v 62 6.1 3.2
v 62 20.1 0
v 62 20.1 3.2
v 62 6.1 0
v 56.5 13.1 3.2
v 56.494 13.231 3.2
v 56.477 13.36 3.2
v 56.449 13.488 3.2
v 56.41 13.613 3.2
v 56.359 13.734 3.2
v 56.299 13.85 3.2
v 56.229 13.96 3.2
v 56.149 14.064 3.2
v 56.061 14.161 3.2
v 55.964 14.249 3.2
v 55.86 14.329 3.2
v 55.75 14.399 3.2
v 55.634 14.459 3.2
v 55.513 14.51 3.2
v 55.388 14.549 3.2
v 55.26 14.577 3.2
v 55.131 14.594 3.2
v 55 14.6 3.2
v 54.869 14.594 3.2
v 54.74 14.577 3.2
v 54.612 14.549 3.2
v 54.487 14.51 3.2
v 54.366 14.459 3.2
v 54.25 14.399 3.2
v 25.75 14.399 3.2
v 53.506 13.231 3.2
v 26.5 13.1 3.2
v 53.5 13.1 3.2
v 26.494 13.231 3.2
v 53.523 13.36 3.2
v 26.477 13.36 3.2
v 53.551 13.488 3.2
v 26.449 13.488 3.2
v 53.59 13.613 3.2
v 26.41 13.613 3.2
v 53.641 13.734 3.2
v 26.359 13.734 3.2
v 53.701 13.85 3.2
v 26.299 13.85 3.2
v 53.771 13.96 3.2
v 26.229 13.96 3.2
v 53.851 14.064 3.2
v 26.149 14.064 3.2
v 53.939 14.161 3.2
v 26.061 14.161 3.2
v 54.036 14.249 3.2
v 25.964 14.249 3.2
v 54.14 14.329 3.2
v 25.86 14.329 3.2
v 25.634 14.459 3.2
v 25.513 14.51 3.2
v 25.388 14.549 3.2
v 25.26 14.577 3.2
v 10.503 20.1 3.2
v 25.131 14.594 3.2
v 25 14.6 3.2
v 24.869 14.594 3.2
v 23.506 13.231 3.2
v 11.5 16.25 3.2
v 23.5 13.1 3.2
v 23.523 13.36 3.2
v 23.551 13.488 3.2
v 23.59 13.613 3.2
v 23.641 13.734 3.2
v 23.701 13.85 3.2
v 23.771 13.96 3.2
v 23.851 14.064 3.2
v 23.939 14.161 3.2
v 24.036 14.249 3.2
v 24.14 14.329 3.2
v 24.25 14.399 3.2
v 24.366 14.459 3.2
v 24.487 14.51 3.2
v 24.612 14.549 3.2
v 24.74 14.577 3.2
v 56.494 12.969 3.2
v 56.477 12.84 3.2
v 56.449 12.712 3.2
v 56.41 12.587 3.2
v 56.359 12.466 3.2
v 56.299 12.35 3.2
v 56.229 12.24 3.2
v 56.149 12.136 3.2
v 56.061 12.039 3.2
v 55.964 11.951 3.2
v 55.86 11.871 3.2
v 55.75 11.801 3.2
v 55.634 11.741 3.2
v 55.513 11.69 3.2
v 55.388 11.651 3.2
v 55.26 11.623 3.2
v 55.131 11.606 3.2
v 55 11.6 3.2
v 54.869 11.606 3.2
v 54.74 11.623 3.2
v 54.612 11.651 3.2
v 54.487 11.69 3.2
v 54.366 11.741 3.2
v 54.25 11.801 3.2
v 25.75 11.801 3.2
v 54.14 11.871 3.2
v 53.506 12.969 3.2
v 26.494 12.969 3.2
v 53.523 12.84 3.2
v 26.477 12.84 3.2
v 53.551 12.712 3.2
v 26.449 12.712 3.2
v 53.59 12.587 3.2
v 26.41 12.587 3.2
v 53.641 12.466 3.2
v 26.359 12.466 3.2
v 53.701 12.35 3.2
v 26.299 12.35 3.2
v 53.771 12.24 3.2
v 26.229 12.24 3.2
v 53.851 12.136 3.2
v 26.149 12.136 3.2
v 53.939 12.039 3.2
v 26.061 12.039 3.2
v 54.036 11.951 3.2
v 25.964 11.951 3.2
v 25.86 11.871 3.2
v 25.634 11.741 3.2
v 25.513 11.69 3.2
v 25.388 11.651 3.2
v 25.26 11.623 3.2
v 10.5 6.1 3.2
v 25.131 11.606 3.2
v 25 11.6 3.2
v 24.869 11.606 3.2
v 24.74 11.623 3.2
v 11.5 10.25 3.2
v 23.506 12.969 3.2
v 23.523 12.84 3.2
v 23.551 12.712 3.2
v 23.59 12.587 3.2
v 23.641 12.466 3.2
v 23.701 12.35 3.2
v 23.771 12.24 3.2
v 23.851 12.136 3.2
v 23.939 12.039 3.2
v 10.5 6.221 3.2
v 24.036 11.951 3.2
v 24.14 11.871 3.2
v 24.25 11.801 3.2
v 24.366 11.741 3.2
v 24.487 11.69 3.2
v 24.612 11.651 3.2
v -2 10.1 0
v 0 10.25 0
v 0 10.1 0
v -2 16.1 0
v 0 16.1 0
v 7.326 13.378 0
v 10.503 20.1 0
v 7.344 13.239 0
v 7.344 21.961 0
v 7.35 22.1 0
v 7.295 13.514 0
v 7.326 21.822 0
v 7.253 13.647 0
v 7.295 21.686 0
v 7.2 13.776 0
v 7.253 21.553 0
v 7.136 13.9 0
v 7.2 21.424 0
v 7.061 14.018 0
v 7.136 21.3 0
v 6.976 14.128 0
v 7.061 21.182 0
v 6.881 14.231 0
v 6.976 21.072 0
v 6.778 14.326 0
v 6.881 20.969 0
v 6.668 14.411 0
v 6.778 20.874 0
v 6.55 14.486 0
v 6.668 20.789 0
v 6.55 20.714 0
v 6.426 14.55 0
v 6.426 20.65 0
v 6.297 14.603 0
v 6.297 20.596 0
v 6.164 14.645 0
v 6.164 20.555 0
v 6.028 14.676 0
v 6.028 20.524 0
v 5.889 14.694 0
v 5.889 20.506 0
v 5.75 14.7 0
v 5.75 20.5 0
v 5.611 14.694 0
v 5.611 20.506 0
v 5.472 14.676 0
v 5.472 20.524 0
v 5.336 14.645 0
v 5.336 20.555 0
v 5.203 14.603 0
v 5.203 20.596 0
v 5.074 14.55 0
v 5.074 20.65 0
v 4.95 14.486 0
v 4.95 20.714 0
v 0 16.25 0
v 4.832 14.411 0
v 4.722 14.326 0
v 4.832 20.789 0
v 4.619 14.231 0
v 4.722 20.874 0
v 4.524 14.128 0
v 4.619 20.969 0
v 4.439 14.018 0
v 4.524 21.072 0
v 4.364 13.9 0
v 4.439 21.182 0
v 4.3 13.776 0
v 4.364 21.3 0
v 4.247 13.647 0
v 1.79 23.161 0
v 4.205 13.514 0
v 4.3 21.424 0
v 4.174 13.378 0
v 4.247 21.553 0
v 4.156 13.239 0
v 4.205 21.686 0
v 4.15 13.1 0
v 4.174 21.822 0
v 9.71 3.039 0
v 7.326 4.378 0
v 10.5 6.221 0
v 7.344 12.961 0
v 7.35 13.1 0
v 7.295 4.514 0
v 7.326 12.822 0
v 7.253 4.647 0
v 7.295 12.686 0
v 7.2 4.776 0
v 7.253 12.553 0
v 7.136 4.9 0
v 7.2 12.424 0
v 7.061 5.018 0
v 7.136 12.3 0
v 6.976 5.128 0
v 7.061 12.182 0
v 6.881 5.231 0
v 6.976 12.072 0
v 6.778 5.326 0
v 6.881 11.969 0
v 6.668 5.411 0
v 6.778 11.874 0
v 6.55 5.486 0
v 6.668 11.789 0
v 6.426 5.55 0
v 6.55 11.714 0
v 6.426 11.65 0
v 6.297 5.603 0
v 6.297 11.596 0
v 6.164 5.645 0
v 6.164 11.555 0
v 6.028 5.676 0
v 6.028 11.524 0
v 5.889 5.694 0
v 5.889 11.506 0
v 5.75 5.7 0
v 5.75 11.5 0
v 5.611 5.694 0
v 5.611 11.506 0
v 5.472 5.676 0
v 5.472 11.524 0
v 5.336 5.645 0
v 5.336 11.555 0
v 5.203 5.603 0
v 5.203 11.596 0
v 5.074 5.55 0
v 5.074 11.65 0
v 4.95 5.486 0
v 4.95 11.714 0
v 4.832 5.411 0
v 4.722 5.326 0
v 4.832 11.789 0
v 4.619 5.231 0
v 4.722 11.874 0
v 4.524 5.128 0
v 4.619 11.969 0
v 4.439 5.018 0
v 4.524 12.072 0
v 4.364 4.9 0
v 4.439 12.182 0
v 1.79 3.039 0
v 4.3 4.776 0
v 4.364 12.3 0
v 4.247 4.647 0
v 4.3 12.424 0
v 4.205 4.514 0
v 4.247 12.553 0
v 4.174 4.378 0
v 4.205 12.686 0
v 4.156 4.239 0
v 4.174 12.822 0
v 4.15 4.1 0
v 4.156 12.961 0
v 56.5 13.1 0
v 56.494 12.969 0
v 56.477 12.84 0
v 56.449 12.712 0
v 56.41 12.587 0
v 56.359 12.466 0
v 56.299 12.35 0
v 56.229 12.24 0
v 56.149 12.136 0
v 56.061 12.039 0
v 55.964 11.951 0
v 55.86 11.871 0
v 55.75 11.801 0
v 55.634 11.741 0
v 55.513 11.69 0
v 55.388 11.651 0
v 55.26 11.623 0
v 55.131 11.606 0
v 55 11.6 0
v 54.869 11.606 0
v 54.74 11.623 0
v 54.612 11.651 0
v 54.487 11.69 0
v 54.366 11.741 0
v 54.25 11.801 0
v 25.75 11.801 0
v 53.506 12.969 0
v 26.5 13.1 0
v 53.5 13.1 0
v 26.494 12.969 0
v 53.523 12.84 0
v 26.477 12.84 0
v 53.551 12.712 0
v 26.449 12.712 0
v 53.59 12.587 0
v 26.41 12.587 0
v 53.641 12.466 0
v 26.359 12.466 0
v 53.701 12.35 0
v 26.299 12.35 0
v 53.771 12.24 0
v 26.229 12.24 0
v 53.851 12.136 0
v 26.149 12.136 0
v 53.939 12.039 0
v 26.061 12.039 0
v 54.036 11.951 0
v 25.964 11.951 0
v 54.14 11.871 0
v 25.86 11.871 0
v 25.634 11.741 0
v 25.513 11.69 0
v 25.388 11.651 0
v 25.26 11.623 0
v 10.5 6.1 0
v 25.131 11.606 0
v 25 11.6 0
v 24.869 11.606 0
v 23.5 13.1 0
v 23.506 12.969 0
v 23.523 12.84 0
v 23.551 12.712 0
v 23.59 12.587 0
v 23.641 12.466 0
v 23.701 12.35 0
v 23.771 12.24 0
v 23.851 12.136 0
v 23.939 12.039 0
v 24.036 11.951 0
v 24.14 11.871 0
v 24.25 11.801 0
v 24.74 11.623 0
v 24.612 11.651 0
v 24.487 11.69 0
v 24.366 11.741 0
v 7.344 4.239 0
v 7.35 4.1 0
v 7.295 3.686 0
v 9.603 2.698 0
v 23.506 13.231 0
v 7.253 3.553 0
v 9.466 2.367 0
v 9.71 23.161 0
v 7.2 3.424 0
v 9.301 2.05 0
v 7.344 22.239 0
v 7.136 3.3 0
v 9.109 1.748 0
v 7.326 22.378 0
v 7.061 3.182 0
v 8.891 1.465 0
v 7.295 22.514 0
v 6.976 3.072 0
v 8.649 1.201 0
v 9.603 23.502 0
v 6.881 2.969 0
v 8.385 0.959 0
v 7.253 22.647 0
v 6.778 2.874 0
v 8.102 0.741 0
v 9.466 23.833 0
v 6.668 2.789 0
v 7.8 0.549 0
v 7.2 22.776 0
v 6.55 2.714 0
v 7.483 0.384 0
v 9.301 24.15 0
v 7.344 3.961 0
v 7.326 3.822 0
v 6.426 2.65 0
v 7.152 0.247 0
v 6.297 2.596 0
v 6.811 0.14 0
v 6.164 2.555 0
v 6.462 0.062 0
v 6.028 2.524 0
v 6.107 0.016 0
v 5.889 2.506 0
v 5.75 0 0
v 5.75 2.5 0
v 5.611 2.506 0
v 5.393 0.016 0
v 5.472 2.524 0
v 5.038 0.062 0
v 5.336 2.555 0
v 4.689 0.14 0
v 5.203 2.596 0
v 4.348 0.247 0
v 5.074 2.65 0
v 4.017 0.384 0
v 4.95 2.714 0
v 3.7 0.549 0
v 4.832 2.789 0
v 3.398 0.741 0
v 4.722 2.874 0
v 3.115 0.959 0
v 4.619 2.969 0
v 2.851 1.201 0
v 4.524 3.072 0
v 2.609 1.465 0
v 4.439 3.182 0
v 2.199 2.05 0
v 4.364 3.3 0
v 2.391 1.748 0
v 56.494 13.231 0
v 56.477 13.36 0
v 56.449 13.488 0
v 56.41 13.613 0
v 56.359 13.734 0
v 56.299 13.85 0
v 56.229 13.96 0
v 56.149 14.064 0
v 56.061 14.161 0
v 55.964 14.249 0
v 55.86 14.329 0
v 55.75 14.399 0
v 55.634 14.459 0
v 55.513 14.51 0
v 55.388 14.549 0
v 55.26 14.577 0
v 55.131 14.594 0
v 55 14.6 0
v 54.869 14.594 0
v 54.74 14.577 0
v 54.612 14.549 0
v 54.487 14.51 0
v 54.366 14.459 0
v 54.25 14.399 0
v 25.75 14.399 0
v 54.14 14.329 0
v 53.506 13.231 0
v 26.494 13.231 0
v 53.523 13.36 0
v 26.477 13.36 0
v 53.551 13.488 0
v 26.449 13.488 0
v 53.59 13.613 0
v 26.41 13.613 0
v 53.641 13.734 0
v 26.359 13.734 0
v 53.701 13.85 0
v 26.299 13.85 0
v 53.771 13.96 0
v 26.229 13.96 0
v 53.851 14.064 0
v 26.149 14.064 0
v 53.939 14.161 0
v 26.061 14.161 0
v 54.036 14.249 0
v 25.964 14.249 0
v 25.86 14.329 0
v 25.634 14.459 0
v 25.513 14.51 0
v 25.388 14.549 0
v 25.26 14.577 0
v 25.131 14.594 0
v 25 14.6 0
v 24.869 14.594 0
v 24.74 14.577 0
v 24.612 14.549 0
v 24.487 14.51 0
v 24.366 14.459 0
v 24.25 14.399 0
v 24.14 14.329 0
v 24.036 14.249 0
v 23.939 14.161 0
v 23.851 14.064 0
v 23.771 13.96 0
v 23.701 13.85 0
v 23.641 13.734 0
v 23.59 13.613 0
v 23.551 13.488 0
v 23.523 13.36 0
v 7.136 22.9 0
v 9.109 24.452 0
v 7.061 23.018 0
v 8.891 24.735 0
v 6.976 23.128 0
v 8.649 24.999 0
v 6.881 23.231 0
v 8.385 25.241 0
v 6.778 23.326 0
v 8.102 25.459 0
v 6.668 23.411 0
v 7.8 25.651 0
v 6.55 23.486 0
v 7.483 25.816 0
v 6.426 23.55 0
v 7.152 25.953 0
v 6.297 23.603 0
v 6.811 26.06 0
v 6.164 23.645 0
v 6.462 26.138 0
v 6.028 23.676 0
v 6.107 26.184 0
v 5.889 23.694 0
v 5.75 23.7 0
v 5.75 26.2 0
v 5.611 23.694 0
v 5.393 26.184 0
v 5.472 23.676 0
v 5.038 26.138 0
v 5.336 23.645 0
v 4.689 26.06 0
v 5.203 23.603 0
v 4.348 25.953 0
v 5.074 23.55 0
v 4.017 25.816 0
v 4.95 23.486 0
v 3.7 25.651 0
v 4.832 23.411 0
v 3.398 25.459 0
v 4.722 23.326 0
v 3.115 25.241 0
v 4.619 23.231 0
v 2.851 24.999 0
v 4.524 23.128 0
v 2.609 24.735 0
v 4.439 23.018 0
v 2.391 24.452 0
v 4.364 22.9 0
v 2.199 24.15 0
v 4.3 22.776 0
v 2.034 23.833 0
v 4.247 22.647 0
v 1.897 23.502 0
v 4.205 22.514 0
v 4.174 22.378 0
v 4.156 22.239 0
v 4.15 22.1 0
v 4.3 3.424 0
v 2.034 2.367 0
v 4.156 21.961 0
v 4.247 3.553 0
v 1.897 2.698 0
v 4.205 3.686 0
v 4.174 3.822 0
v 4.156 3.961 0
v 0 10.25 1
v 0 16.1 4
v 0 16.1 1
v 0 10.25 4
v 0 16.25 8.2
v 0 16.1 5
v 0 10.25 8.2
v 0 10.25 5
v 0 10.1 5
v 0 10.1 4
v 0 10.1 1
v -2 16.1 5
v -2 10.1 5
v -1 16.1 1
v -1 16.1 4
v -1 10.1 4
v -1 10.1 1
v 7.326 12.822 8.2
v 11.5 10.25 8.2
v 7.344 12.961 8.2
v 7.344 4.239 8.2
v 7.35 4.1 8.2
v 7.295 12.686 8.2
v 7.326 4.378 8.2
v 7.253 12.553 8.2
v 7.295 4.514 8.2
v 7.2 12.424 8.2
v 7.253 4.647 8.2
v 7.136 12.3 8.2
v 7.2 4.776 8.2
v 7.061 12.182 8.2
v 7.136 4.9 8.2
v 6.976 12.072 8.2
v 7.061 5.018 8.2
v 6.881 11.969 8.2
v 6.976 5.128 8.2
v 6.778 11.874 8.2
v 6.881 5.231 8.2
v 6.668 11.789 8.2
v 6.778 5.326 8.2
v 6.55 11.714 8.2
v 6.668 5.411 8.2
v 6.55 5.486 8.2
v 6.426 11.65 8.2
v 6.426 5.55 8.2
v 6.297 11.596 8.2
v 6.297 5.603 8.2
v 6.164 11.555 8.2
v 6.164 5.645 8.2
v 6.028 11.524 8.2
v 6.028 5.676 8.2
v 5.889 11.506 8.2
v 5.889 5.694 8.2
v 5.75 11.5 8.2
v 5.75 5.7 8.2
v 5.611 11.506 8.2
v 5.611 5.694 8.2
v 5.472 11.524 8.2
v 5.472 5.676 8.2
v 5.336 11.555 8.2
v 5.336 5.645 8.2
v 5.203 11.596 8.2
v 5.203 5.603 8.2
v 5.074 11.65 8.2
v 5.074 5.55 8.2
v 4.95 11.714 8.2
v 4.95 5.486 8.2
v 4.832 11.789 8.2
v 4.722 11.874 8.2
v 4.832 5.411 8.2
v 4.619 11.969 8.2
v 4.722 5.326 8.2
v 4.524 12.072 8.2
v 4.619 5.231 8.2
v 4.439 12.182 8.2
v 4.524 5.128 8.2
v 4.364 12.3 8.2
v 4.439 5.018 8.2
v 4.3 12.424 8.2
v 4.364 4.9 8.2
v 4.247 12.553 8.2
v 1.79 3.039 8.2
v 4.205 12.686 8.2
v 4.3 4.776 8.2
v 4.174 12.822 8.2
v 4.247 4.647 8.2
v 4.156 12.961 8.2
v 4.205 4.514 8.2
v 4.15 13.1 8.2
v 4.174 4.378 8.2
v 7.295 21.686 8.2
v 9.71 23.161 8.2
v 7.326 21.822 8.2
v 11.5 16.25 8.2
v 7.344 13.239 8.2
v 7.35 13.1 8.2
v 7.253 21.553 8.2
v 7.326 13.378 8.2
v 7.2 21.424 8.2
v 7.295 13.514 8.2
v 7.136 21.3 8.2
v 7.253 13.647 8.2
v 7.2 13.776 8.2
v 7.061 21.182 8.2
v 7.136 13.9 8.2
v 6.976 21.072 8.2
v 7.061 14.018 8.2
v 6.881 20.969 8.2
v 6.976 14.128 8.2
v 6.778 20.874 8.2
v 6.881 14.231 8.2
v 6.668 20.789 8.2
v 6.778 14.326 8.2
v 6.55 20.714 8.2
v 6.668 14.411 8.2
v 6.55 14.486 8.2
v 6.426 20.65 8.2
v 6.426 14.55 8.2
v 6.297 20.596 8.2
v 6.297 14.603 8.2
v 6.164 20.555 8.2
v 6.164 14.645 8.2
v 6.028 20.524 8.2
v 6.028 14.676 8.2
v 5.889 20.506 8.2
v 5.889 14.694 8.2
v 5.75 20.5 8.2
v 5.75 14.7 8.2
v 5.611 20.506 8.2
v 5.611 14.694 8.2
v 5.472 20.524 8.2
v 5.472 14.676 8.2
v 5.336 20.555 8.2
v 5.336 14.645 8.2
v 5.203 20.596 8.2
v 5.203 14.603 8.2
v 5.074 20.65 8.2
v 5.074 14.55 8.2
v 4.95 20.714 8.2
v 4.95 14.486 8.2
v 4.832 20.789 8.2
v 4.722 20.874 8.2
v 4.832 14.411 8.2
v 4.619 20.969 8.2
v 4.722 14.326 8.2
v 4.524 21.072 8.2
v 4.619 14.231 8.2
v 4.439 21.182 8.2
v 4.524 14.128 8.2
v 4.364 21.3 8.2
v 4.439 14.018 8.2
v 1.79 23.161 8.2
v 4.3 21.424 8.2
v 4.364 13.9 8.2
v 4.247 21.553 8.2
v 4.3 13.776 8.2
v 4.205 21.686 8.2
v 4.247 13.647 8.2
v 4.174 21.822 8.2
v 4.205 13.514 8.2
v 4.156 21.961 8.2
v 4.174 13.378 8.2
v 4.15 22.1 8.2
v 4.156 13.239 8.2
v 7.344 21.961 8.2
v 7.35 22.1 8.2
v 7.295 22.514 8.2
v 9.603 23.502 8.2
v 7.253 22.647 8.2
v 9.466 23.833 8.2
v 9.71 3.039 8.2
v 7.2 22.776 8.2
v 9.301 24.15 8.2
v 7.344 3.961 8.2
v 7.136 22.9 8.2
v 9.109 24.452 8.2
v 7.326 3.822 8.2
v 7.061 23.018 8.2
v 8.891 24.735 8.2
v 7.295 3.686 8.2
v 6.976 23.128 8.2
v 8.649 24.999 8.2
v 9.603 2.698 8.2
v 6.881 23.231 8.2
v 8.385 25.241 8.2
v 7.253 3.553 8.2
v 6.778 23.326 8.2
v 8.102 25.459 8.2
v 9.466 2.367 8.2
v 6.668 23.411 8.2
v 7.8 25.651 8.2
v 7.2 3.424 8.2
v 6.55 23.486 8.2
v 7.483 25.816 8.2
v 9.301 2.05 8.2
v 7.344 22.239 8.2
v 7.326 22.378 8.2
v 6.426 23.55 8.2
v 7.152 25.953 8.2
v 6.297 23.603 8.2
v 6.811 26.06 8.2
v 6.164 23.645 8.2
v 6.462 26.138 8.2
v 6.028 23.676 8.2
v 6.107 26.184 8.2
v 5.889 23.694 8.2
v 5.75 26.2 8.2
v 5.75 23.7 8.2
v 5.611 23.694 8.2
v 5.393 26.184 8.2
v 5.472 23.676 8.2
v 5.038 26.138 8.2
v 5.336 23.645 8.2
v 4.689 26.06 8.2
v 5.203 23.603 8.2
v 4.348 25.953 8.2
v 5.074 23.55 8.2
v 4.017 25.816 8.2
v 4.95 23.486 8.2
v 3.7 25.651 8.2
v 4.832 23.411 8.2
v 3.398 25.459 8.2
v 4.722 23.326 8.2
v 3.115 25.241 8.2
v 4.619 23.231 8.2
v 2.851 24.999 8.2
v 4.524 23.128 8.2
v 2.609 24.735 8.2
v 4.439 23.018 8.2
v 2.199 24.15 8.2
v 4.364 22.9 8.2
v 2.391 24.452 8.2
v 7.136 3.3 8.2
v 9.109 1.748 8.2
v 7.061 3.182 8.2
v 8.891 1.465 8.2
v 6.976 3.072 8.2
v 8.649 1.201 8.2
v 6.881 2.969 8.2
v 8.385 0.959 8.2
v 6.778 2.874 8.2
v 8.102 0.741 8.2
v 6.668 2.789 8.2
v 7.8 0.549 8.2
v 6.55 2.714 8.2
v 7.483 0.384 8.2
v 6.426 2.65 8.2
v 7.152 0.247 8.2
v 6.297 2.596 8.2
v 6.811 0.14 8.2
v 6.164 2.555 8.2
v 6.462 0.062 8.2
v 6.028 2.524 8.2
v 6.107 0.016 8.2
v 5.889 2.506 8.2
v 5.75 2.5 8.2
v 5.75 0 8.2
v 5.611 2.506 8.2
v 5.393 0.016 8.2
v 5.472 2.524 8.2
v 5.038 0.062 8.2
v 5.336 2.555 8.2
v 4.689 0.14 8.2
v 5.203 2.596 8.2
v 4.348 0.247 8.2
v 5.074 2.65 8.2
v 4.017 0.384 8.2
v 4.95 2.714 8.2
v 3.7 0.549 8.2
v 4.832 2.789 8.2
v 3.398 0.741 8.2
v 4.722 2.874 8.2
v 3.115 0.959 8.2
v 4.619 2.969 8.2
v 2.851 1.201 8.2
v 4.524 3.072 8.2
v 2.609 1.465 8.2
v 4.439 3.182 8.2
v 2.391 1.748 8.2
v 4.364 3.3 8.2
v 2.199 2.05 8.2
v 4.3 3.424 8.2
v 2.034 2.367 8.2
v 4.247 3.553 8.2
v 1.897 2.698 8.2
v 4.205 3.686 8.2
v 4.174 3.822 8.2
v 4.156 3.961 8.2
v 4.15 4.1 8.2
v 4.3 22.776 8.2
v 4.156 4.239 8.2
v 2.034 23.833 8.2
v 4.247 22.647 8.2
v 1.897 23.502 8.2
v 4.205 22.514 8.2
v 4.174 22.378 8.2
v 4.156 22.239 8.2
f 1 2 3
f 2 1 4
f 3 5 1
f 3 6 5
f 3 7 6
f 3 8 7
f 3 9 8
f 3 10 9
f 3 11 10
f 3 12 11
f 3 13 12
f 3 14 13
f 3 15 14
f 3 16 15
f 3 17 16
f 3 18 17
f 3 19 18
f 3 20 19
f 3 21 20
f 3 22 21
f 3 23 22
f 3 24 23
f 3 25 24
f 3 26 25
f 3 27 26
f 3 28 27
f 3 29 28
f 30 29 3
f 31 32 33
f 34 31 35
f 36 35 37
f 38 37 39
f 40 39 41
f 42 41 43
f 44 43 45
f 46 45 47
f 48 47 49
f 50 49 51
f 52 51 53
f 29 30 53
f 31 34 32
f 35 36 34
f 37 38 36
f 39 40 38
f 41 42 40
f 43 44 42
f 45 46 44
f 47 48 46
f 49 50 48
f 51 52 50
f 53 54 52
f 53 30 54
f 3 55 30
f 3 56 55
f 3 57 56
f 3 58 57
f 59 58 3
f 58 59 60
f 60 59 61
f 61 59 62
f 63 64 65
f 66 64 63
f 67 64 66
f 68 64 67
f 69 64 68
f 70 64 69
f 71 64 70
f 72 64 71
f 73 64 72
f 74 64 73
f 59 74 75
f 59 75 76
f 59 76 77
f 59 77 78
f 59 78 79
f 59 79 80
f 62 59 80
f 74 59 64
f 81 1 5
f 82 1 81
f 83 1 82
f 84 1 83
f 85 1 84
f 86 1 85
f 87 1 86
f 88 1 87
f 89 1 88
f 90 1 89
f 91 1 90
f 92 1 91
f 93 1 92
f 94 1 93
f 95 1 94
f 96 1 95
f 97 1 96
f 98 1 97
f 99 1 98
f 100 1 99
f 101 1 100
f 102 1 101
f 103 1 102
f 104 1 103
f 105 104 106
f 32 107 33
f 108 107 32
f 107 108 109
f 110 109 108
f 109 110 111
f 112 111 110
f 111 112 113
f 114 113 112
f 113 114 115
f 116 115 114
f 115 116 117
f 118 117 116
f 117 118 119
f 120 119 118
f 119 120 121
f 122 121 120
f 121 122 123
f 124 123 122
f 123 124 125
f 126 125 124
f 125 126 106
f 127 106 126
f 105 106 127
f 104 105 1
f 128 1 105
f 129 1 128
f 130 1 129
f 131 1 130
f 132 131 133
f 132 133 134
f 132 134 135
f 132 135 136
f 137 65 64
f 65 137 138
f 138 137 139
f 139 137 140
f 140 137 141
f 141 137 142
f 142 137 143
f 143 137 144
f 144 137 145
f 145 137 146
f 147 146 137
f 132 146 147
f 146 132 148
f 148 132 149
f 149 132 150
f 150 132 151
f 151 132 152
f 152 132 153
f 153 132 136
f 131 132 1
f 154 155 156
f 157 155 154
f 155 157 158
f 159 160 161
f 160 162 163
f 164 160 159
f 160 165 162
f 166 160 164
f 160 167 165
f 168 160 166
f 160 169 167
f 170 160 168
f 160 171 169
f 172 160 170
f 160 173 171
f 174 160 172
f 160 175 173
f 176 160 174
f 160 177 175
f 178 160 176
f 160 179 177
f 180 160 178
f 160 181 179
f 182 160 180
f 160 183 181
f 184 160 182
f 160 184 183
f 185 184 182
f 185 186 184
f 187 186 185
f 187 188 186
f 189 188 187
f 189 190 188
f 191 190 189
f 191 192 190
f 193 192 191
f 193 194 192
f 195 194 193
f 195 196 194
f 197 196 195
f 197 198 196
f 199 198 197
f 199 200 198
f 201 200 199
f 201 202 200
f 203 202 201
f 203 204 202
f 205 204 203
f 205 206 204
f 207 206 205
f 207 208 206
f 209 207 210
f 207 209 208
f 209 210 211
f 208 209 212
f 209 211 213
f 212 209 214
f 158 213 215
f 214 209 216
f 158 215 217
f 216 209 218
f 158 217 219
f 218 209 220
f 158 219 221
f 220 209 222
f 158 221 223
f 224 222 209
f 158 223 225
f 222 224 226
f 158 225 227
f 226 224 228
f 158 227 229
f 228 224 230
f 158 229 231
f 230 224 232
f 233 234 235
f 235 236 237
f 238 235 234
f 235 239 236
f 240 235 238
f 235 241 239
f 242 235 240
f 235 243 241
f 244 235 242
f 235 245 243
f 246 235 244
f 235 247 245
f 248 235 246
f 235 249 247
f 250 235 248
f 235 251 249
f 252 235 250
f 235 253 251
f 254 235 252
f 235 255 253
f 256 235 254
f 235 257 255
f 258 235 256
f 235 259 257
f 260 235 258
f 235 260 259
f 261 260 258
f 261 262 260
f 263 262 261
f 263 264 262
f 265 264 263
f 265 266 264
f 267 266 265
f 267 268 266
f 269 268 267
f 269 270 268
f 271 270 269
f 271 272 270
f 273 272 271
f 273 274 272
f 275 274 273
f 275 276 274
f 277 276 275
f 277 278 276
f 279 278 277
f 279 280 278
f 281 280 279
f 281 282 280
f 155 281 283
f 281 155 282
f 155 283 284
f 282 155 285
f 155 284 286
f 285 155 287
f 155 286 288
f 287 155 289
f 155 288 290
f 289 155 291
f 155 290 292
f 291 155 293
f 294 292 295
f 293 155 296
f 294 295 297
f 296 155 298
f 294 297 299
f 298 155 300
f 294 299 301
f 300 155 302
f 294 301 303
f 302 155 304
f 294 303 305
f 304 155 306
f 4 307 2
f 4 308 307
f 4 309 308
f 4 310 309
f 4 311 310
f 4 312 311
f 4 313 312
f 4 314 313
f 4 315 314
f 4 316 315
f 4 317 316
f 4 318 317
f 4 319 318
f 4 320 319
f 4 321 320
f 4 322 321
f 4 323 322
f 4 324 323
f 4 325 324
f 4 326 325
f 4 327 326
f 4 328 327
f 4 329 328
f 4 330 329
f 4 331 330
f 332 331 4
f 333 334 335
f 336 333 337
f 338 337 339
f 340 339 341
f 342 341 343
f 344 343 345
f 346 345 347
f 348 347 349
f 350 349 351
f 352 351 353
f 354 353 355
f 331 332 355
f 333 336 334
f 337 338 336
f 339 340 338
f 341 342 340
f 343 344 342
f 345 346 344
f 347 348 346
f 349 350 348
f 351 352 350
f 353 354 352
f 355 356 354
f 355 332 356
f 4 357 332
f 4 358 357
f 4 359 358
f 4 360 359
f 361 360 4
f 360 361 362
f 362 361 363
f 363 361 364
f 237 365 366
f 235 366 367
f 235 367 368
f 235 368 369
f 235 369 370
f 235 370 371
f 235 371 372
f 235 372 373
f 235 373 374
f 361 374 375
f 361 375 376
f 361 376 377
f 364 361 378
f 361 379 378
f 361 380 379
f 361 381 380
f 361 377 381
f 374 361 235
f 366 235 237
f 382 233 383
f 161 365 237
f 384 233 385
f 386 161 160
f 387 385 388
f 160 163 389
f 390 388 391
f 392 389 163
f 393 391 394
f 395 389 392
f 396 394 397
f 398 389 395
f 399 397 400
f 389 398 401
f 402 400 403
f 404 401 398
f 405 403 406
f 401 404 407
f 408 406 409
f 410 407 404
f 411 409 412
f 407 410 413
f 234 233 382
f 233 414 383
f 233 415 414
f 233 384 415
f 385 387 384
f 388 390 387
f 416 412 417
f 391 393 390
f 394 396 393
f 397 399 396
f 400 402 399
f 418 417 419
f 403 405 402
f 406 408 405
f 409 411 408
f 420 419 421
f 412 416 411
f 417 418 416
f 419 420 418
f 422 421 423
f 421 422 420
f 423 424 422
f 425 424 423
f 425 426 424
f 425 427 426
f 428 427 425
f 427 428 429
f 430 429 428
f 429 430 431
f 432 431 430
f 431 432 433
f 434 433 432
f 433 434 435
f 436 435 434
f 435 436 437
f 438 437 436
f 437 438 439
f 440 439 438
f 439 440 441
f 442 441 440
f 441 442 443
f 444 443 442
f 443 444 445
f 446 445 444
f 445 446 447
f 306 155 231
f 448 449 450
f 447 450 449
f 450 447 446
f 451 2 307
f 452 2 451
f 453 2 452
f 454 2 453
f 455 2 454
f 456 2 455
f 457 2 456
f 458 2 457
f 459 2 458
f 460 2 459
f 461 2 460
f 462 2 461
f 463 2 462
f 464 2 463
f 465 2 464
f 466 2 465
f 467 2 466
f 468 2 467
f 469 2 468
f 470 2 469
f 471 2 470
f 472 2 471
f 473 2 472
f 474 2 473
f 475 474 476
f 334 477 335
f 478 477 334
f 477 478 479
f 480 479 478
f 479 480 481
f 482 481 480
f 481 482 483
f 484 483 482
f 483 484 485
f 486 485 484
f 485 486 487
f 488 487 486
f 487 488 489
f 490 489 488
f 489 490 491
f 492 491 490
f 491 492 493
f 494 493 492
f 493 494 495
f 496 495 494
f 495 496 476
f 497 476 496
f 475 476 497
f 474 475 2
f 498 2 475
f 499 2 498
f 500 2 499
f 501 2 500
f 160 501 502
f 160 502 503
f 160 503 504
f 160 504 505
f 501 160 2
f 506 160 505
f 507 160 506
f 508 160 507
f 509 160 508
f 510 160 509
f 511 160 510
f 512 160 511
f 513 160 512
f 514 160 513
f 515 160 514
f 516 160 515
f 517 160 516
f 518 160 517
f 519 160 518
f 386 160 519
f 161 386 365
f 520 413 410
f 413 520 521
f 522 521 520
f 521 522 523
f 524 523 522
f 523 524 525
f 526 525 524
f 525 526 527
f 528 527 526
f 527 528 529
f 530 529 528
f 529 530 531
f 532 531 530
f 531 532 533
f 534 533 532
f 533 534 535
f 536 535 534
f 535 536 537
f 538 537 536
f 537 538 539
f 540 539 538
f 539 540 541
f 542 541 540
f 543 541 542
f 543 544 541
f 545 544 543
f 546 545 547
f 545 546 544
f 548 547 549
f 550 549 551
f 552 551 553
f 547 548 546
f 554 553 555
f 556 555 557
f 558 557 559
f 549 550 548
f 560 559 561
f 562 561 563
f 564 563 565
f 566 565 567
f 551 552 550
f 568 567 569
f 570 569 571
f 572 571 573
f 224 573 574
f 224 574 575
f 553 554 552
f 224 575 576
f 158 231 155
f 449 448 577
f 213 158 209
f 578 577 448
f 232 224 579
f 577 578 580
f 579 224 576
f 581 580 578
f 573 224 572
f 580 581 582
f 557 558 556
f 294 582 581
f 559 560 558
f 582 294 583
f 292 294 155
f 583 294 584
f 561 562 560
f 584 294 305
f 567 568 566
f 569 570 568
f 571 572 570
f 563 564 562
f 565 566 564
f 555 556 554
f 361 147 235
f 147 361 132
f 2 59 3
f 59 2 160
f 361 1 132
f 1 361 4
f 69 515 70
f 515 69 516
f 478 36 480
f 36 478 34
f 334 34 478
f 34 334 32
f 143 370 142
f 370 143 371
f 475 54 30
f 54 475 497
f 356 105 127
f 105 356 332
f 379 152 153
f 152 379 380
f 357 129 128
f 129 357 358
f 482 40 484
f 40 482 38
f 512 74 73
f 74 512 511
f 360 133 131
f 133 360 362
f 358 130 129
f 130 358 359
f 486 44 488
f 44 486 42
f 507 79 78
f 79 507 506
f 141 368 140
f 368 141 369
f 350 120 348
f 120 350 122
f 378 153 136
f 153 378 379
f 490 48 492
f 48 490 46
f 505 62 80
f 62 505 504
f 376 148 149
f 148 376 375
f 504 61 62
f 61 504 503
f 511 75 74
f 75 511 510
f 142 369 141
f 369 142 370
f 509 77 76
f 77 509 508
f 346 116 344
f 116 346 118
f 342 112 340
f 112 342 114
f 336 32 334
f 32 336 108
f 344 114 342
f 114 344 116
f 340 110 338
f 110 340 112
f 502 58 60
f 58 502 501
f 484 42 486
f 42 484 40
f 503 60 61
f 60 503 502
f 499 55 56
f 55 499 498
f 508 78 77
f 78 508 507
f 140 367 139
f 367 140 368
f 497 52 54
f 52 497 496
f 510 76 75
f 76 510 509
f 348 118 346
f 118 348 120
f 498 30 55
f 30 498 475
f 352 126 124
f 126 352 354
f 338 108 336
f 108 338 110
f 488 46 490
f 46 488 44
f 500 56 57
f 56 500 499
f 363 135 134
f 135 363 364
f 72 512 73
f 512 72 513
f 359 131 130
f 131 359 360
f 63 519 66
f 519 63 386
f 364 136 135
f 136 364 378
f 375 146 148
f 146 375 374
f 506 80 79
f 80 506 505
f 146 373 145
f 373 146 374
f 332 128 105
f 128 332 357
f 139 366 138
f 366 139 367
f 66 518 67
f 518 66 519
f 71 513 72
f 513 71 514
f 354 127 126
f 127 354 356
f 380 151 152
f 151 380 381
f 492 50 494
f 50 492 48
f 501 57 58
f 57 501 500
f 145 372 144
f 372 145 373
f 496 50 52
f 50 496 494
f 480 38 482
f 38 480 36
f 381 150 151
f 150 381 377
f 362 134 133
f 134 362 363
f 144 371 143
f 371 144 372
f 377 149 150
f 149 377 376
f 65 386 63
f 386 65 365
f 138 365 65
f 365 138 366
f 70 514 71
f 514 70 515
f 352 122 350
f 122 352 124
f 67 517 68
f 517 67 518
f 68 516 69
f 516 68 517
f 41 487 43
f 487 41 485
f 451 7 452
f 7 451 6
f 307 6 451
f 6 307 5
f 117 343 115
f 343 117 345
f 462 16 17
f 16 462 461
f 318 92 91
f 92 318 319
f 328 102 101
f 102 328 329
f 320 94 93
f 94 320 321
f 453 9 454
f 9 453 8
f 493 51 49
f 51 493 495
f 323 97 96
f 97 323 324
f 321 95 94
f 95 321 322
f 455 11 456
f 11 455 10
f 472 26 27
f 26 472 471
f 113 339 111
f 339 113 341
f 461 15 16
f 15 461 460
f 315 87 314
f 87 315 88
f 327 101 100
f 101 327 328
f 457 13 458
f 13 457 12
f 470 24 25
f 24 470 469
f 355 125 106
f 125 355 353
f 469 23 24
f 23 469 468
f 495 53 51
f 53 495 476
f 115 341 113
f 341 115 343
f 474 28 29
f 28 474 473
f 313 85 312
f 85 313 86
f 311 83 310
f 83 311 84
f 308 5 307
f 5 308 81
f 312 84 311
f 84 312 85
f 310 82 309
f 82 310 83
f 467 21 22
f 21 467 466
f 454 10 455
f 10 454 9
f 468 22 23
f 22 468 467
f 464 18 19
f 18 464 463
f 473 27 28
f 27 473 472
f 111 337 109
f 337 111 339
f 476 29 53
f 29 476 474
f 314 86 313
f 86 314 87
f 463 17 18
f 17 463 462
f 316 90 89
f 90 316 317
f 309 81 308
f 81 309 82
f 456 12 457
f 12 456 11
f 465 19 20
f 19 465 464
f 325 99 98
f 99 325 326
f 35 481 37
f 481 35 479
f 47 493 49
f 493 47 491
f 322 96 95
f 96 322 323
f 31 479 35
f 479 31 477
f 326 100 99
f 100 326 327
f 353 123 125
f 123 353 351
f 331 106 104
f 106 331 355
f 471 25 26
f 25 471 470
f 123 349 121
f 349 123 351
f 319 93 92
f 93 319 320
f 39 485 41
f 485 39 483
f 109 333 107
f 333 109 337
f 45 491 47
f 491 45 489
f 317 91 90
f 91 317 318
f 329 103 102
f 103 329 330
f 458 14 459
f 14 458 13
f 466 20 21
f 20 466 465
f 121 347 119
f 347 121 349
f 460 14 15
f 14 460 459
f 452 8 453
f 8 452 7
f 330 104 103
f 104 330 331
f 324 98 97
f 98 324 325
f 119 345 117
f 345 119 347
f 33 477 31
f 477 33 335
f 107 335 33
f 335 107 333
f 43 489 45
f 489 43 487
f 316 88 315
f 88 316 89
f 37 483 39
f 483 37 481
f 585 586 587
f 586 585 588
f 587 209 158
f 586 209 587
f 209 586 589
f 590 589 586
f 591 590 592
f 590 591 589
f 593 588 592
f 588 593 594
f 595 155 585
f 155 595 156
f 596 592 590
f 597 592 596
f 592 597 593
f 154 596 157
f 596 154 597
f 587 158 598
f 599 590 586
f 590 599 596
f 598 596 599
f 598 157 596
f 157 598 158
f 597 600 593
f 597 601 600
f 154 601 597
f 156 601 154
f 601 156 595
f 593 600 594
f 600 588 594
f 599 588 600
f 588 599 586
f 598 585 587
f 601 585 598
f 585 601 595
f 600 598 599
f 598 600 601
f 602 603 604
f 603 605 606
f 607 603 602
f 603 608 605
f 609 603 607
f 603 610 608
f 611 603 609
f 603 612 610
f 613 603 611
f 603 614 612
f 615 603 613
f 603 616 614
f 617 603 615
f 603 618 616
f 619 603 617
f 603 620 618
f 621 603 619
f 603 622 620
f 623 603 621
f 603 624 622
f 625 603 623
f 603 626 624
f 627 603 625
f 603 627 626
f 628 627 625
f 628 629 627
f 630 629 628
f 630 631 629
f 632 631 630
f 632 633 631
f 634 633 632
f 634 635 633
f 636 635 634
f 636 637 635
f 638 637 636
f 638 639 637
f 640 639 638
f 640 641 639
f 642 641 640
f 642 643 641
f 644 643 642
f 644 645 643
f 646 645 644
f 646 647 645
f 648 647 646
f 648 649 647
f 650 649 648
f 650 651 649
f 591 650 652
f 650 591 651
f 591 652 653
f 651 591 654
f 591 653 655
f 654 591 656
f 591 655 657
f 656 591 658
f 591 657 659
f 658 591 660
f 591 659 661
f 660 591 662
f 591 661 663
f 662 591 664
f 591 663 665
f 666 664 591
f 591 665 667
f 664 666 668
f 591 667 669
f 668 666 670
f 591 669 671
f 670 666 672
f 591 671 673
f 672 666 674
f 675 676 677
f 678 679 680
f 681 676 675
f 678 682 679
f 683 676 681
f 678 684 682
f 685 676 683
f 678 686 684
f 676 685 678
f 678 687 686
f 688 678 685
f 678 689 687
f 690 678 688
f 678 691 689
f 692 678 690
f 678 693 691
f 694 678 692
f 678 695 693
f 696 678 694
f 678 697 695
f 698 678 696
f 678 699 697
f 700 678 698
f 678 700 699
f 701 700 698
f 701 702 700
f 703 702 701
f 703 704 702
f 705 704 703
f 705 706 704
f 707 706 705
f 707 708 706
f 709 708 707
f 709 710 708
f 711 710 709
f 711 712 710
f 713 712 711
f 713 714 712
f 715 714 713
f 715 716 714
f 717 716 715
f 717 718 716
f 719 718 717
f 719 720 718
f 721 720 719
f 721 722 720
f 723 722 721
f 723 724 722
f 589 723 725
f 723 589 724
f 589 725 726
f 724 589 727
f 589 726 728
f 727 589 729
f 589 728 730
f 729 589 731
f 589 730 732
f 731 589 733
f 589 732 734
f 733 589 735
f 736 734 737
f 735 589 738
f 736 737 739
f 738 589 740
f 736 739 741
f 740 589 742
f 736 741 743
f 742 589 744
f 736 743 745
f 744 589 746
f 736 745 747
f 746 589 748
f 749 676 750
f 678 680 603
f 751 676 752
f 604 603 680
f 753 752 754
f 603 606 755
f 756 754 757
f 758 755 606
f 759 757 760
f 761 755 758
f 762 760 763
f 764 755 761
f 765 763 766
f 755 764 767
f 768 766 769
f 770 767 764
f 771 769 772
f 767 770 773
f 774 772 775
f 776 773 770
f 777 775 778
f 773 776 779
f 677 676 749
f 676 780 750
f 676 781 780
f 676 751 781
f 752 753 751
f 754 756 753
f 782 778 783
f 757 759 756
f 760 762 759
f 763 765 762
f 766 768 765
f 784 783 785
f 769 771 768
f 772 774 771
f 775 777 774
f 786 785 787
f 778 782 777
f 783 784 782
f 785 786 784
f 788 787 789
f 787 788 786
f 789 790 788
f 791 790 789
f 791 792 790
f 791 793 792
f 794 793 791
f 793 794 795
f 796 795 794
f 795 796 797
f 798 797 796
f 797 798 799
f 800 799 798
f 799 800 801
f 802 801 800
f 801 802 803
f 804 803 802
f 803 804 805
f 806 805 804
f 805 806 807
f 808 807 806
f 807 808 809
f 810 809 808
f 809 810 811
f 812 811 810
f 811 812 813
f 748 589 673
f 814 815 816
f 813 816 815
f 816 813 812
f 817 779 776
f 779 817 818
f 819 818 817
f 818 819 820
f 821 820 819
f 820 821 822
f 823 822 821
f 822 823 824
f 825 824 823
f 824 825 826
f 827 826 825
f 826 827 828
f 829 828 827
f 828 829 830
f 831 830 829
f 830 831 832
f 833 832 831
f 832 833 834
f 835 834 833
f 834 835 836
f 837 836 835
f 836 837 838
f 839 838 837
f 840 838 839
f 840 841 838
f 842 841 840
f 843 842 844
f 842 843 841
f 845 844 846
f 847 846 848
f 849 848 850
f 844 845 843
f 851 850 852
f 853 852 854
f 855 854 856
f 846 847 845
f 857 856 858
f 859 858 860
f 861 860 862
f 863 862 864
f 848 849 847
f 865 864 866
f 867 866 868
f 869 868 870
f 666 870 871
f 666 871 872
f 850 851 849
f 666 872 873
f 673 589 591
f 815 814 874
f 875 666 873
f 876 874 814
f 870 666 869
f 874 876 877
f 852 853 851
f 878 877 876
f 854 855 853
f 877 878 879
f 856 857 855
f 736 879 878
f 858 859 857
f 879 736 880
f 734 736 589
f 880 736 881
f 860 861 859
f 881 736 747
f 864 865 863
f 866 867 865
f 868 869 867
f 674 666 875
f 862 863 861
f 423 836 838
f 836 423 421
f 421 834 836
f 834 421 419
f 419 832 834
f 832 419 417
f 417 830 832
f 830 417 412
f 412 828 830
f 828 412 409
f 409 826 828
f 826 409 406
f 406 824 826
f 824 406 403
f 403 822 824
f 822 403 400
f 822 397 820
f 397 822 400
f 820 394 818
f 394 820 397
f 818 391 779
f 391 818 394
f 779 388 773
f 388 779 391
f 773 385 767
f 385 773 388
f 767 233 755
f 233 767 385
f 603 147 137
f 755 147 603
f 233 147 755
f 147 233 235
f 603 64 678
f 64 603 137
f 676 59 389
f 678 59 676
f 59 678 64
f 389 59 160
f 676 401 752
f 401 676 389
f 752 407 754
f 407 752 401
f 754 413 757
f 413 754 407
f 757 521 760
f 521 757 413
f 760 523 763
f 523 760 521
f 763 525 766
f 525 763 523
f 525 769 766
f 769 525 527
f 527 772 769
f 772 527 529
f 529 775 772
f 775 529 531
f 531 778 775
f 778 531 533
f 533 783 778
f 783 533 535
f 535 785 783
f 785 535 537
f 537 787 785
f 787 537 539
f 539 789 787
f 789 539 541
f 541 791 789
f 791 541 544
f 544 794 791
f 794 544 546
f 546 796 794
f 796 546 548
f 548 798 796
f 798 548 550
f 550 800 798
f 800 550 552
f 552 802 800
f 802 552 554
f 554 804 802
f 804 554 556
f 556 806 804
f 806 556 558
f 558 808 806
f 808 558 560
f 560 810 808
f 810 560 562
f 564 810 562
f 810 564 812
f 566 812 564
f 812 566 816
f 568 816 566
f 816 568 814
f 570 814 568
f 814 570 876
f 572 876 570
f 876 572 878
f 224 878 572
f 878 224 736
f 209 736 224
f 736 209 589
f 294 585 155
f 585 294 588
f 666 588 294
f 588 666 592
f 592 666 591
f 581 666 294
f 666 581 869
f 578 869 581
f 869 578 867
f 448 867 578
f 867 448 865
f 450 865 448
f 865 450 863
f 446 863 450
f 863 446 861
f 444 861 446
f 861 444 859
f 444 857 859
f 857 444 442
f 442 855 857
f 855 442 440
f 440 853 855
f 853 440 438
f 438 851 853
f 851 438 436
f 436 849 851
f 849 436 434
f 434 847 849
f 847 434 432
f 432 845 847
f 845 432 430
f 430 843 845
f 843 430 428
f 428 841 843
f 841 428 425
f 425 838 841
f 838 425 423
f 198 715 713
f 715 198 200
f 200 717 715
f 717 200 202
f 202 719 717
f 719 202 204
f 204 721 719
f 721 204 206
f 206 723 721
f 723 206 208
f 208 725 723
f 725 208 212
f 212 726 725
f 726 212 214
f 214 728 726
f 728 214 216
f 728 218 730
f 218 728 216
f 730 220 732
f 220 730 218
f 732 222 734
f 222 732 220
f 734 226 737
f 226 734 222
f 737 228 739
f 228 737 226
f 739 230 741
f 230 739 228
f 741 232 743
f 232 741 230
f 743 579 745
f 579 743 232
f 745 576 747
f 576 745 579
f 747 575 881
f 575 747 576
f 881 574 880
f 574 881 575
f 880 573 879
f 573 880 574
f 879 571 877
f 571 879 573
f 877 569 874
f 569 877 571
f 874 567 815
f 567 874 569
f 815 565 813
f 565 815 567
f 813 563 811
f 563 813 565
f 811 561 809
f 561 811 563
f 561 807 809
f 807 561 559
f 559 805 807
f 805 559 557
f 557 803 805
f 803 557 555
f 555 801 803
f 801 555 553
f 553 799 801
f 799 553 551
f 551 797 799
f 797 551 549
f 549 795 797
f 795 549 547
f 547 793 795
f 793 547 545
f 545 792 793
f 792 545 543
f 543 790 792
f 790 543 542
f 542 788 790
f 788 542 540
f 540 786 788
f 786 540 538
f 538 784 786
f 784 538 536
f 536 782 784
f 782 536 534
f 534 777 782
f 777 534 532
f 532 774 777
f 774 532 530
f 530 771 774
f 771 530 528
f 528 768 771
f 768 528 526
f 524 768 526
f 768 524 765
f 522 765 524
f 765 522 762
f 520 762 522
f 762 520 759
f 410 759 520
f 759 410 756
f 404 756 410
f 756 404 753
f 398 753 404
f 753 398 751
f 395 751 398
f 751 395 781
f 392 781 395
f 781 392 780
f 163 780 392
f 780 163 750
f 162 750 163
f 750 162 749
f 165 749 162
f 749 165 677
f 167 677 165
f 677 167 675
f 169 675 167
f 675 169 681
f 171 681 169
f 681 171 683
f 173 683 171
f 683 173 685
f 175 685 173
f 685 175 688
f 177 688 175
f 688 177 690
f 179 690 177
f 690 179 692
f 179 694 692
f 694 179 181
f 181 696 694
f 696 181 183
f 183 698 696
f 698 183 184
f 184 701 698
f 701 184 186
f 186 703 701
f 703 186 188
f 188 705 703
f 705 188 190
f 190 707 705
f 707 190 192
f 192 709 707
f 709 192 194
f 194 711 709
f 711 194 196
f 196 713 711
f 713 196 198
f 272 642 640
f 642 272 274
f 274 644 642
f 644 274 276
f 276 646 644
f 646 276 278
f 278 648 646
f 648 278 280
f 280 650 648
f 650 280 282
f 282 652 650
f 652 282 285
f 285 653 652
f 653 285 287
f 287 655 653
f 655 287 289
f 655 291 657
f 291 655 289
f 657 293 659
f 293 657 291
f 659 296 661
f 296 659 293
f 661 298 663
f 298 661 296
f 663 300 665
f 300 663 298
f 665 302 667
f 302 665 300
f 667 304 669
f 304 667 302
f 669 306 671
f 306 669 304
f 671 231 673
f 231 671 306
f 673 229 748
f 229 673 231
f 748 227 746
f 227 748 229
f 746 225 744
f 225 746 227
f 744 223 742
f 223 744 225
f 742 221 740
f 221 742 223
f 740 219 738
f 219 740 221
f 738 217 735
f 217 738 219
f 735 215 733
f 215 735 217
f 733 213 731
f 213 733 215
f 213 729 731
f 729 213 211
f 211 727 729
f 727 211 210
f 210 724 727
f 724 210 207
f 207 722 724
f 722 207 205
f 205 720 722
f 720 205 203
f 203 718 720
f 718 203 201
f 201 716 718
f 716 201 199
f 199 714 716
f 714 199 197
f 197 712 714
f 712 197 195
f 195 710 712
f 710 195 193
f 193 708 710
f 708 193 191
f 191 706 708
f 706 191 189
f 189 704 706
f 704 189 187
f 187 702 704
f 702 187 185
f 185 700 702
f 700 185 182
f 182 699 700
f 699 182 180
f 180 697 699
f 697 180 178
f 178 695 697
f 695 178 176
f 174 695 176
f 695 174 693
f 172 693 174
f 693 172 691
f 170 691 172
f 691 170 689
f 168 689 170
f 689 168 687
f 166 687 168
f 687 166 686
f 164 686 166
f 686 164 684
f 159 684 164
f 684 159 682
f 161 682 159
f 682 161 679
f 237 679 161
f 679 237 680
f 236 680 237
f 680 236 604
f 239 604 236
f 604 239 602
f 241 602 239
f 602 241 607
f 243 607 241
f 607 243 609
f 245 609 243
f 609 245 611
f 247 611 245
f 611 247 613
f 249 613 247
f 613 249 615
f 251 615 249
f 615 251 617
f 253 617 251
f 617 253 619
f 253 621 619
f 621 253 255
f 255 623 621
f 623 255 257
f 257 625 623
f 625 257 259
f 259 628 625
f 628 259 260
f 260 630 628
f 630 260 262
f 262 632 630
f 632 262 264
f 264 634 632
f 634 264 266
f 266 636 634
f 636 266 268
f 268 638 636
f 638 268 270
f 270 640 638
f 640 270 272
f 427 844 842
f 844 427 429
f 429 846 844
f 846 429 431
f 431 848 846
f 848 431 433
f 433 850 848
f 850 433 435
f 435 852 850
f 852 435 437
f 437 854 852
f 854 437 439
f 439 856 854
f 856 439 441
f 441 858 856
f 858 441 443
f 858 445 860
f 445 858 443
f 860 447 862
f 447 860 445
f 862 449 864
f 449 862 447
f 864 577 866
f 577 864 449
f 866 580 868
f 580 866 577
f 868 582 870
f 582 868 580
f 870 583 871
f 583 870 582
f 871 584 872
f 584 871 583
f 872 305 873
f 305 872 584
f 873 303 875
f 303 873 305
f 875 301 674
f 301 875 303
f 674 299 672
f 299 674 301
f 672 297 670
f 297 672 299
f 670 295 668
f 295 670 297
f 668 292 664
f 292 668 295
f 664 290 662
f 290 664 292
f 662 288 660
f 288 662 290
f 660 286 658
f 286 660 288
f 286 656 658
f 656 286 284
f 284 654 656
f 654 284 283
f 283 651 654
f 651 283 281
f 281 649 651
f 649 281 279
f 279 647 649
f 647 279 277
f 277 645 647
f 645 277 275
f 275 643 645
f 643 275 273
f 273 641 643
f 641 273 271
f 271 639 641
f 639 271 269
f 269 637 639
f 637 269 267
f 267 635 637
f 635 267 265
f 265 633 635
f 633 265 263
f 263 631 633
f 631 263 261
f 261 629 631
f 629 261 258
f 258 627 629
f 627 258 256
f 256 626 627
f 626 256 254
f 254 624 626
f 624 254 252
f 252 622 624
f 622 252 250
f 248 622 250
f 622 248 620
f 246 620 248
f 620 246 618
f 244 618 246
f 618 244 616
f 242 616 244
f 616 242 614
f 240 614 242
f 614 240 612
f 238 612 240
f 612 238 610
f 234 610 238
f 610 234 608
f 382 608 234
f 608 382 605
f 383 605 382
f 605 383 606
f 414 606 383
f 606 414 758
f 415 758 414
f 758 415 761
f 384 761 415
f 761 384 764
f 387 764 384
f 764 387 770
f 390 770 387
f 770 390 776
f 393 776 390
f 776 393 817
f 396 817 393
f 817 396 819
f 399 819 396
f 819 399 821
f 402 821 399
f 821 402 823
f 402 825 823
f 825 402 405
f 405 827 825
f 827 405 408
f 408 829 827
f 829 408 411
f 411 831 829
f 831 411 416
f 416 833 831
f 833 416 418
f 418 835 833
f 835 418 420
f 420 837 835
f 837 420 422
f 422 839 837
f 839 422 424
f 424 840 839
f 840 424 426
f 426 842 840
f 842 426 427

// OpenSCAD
mount_z_offset = 5;
mount_length = 63;

bltouch_head_rect_width = 11.5;
bltouch_head_rect_length = 6;
bltouch_hole_diameter = 3.2;
bltouch_hole_edge = 2.5;
bltouch_hole_pitch = 18;

arm_hole_pitch = 30;
arm_hole_distance_from_end = 7;
arm_width = 14;
arm_length = mount_length - bltouch_head_rect_width;
arm_height = 3.2;

zip_tie_width = 2.5;
strain_relief_height = arm_height;

$fn = 72;

print_parts();

module print_parts() {
    print_head();
    print_arm();
    print_strain_relief();
}

module print_strain_relief() {
    translate([-2, (bltouch_hole_pitch + bltouch_hole_diameter + 2 * bltouch_hole_edge) / 2 - bltouch_head_rect_length / 2 , 0])
        difference() {
            cube([2, bltouch_head_rect_length, zip_tie_width * 1.2 + 2]);
            translate([1 , 0 - bltouch_head_rect_length / 2 , 1])
                cube([1, bltouch_head_rect_length * 2, zip_tie_width * 1.2]);
        }
}

module print_head() {
    linear_extrude(arm_height + mount_z_offset) {
        difference() {
            hull() {
                translate([bltouch_head_rect_width / 2,  bltouch_hole_diameter / 2 + bltouch_hole_edge]) {
                    circle(d = bltouch_hole_diameter + bltouch_hole_edge * 2);
                    translate([0, bltouch_hole_pitch, 0])
                        circle(, d = bltouch_hole_diameter + bltouch_hole_edge * 2);
                }
                translate([0, (bltouch_hole_pitch + bltouch_hole_edge) / 2])
                    square([bltouch_head_rect_width, bltouch_head_rect_length]);
            }
            translate([bltouch_head_rect_width / 2,  bltouch_hole_diameter / 2 + bltouch_hole_edge]) {
                circle(d = bltouch_hole_diameter);
                translate([0, bltouch_hole_pitch, 0])
                    circle(, d = bltouch_hole_diameter);
                translate([0, bltouch_hole_pitch / 2, 0])
                    circle(, d = bltouch_hole_diameter);

            }
        }
    }
}

module print_arm() {
    translate([bltouch_head_rect_width - 1, (bltouch_hole_pitch + bltouch_hole_diameter + 2 * bltouch_hole_edge) / 2 - arm_width / 2 , 0])
        difference() {
            cube([arm_length, arm_width, arm_height]);
            translate([arm_length - arm_hole_distance_from_end - arm_hole_pitch, arm_width / 2, 0 - arm_height / 2])
                cylinder(h = arm_height * 2, d = 3);
            translate([arm_length - arm_hole_distance_from_end, arm_width / 2, 0 - arm_height / 2])
                cylinder(h = arm_height * 2, d = 3);
        }
    }
